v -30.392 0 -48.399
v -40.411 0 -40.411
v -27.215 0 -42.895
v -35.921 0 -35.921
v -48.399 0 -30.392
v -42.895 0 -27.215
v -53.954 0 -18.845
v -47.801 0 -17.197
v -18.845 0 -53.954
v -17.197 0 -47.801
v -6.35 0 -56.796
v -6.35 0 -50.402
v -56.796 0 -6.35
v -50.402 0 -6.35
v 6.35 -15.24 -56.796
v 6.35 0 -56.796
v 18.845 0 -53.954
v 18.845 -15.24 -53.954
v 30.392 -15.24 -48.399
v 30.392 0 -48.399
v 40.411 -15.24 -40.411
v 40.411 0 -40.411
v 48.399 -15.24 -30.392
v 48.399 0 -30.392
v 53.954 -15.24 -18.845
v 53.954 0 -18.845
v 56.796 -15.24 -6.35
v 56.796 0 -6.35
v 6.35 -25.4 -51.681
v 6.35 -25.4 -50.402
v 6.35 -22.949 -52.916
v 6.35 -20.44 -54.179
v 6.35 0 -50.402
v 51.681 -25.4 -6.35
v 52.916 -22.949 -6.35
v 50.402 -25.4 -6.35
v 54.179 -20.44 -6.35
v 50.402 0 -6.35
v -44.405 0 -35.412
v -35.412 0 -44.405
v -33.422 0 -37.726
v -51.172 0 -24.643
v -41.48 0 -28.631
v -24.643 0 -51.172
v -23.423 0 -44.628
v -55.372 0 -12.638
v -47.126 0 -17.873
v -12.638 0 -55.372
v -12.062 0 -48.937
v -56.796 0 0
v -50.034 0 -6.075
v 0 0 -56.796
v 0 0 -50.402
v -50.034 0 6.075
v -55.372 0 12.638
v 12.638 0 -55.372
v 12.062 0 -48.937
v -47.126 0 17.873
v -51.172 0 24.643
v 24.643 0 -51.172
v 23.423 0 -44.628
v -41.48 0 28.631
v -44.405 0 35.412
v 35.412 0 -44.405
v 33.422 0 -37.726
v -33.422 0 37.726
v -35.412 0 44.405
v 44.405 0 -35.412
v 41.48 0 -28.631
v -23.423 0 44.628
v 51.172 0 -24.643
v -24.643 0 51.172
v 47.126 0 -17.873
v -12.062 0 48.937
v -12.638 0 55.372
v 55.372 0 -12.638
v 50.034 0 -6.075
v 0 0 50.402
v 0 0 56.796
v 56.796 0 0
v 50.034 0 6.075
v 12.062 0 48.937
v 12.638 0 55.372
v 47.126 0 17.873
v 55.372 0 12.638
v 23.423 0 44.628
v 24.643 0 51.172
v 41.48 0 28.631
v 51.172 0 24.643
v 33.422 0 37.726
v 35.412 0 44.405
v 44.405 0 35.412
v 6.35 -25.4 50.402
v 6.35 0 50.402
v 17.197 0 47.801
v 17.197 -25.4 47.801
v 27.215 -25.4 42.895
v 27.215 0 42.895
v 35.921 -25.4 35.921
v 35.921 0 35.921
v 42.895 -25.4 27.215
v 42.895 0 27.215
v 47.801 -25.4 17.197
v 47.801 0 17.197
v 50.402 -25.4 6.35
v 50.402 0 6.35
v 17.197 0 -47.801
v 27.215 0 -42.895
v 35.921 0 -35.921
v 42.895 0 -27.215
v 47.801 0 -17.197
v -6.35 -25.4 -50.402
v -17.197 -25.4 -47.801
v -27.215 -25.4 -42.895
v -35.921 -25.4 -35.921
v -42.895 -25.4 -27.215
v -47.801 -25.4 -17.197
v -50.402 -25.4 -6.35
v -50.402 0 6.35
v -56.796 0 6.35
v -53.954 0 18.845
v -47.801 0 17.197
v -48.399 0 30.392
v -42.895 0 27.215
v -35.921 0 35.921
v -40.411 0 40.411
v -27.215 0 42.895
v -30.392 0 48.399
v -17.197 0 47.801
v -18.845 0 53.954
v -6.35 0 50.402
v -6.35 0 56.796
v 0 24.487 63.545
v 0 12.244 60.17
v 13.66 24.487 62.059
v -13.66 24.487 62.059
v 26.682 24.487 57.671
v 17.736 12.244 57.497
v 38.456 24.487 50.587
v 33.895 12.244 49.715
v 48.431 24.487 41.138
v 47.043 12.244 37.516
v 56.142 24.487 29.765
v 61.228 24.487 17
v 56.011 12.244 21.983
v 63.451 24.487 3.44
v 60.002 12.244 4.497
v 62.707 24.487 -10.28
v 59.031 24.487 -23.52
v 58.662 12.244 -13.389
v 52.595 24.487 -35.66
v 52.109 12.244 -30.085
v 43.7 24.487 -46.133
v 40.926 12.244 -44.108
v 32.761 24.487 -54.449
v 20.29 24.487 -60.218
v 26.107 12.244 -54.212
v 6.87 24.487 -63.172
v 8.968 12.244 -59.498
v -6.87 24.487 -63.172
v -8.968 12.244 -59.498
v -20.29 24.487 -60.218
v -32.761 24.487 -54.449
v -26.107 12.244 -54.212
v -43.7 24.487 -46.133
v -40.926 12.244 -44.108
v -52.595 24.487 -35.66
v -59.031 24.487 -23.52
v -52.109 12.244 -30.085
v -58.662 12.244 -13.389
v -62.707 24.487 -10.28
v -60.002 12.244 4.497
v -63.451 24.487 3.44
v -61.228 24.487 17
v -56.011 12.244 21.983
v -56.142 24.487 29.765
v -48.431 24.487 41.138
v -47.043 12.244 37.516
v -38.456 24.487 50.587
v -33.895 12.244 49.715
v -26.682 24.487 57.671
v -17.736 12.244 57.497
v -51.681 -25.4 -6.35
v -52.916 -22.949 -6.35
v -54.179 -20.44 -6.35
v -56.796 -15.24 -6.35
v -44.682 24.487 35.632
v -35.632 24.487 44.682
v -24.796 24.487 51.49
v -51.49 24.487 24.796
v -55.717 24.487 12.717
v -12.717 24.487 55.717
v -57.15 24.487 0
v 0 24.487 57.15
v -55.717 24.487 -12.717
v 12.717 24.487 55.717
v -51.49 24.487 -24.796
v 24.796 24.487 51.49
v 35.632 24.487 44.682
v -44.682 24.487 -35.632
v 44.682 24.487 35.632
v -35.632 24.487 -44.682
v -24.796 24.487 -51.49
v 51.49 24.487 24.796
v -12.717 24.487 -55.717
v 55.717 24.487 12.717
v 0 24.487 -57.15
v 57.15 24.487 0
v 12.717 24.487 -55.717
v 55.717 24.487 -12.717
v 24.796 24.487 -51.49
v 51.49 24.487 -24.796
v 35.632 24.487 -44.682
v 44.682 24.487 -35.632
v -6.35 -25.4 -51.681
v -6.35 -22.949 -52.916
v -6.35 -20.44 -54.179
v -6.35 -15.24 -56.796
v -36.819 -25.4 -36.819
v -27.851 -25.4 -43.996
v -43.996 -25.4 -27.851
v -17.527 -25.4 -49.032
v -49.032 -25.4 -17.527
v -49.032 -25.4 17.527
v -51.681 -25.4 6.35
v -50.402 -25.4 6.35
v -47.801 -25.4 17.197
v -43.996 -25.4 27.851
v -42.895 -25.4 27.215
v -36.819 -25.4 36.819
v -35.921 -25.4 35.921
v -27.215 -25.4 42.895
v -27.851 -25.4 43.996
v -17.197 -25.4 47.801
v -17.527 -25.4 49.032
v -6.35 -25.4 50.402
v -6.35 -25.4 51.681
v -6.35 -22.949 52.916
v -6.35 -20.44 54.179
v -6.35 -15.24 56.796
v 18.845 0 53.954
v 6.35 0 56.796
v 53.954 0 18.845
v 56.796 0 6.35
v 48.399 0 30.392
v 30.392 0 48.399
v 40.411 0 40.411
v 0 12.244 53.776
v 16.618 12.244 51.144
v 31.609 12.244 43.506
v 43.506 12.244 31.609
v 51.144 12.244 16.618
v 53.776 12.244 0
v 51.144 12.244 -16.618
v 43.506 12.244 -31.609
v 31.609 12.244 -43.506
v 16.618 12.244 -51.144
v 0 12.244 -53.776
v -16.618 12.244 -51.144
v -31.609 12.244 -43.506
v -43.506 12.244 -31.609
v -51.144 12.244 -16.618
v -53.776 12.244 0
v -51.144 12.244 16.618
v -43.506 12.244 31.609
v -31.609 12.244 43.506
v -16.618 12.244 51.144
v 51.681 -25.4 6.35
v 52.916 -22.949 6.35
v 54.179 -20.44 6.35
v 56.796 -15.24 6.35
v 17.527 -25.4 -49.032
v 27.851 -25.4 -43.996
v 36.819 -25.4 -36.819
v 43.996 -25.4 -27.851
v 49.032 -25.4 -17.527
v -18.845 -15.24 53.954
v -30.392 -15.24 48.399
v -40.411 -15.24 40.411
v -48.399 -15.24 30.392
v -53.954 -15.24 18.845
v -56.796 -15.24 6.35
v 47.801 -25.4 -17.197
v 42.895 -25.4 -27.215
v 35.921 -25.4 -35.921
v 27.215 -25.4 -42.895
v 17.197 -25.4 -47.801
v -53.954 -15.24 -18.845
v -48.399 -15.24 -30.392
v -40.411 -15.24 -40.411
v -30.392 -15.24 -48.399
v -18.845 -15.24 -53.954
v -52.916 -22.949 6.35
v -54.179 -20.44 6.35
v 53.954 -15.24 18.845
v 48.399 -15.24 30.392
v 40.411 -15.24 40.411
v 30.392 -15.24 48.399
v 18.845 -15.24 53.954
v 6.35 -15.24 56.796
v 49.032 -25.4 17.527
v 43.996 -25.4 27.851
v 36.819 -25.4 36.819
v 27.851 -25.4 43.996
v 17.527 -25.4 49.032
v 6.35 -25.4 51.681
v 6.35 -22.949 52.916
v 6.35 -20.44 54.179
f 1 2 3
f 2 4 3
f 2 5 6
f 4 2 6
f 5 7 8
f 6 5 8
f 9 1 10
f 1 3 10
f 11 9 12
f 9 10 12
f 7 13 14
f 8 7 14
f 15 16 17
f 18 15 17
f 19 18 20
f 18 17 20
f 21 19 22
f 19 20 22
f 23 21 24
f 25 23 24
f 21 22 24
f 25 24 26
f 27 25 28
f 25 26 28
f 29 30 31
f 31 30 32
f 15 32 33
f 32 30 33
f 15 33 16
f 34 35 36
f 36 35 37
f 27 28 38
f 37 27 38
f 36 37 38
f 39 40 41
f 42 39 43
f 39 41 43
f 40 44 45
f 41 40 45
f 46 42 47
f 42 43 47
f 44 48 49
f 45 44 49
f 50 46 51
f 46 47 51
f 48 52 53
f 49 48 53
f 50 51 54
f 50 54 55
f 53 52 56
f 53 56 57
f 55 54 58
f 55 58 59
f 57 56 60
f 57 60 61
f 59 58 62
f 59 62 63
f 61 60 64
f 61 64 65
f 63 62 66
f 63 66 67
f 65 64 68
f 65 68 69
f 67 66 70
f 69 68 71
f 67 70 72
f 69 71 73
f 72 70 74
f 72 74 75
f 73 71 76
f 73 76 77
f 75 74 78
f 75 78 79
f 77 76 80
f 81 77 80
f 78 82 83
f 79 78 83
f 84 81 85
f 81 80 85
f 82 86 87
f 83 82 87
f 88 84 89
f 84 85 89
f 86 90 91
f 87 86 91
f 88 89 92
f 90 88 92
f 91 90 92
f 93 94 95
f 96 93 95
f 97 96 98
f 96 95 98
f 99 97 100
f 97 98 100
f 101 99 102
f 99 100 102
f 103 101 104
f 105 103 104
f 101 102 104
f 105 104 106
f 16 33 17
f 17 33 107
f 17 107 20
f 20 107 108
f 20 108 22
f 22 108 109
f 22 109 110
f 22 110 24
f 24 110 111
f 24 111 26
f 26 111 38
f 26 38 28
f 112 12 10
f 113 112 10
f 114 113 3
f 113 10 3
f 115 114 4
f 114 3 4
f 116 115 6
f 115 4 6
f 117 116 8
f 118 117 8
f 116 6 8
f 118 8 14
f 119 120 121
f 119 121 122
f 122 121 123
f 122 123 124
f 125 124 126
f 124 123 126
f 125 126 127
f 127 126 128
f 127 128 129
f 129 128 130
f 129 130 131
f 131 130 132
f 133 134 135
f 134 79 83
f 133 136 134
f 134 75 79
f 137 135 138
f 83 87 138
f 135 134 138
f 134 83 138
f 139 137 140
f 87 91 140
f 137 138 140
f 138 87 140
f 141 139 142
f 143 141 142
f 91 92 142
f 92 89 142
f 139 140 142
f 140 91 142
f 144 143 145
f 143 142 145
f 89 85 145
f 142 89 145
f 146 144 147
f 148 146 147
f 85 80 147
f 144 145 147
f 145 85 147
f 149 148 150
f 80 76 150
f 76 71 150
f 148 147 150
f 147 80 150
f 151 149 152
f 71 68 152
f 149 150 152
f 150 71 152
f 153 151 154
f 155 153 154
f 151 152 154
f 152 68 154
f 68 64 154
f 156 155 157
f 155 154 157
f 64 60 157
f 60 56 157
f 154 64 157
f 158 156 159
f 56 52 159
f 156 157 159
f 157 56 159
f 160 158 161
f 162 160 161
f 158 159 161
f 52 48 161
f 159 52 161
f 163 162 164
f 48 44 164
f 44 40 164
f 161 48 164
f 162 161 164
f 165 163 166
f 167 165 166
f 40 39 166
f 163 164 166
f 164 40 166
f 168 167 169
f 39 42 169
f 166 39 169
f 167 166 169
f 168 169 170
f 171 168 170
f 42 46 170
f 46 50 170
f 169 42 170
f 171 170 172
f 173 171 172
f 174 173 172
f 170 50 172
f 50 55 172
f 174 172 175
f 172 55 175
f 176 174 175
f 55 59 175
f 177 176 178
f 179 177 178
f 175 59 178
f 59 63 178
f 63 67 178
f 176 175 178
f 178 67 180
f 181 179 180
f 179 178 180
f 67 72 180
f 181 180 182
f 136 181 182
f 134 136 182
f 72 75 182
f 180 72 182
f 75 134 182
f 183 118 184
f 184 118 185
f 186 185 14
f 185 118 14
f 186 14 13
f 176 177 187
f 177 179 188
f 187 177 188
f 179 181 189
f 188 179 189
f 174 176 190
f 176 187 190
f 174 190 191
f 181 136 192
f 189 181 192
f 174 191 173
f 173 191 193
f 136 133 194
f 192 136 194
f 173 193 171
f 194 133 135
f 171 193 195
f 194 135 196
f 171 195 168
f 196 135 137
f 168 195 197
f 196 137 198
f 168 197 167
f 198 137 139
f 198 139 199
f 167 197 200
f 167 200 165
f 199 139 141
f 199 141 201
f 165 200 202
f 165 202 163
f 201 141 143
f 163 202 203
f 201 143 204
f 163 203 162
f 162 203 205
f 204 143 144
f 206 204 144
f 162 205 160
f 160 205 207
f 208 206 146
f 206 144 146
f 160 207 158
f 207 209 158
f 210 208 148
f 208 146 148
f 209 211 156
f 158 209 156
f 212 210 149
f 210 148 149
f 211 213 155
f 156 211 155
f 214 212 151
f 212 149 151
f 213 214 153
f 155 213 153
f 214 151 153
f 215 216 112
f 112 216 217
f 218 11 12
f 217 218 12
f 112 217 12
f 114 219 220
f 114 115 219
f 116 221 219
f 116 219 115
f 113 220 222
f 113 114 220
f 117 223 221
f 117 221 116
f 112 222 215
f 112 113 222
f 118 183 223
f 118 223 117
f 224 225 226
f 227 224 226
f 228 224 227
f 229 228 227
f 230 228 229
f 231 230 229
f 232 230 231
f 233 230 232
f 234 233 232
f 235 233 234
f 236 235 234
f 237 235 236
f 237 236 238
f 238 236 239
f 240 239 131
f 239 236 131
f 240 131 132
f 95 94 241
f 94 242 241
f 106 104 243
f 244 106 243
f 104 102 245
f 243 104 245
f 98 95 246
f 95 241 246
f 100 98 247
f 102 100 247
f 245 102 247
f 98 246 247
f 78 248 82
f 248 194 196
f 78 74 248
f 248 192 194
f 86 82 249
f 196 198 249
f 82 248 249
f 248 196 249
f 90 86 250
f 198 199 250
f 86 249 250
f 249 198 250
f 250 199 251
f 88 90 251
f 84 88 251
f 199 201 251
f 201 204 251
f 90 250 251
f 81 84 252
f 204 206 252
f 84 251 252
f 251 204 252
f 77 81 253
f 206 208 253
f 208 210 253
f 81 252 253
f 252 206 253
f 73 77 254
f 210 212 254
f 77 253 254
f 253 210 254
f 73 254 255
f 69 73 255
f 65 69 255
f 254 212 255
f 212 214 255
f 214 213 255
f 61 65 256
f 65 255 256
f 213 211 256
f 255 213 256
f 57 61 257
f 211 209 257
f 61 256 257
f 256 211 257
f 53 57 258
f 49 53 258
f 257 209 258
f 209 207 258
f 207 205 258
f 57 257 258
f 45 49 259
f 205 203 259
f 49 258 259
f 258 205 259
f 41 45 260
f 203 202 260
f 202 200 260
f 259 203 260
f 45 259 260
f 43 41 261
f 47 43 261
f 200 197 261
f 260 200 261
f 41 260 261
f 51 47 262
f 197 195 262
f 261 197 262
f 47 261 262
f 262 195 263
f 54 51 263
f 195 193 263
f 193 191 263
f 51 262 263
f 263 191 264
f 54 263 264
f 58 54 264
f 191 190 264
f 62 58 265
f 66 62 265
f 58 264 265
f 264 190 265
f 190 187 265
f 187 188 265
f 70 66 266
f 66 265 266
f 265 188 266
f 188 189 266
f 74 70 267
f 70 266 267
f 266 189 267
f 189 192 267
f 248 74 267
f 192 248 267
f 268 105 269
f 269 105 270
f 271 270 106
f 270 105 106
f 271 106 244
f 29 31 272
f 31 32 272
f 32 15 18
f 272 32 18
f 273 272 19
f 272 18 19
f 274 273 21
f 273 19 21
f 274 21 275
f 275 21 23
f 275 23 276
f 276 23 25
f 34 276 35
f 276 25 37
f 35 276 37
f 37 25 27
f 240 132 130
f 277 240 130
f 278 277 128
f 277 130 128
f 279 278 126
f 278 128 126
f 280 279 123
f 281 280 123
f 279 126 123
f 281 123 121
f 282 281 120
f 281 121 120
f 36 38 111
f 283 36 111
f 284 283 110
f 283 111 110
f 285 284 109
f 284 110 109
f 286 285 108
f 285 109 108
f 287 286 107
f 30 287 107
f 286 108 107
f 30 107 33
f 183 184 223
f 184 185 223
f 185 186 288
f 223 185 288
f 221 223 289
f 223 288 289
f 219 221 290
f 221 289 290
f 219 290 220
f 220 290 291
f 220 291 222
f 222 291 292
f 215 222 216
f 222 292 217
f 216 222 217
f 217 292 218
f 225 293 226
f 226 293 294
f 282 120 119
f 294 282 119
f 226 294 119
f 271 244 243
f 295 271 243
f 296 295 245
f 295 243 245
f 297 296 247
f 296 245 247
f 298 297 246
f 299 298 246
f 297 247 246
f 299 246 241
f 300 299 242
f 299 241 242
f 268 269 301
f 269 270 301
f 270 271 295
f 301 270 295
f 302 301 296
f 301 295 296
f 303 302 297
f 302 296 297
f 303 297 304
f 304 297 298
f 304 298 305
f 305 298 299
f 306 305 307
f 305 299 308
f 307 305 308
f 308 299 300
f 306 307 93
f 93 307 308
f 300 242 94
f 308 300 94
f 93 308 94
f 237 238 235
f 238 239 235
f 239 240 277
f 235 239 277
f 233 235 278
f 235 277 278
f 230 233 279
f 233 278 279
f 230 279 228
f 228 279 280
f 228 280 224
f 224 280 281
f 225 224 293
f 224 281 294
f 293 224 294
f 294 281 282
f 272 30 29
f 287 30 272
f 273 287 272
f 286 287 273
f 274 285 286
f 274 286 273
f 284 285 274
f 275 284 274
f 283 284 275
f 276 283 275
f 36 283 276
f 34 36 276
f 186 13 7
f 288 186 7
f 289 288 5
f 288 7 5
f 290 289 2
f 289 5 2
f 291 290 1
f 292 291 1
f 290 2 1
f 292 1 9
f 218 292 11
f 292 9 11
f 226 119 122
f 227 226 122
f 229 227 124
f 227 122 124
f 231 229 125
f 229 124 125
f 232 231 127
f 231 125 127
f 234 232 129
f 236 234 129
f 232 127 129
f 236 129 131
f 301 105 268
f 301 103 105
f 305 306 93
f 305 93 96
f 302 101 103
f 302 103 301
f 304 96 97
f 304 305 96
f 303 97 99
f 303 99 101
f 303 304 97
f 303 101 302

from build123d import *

# Parameters (mm, degrees)
F1_DEPTH   = 25.4
F4_SIZE2   = 10.16
F4_SIZE    = 5.08
F4_2_SIZE2 = 10.16
F4_2_SIZE  = 5.08
F4_3_SIZE2 = 10.16
F4_3_SIZE  = 5.08
F4_4_SIZE2 = 10.16
F4_4_SIZE  = 5.08


with BuildPart() as f1:
    # F0 (on Front) → F1 (new body)
    with BuildSketch(Plane.XZ):
        with BuildLine():
            ThreePointArc((-50.4015624758, 6.35), (-35.9210244843, 35.9210244843), (-6.35, 50.4015624758))
            Line((-6.35, 50.4015624758), (-6.35, 56.7961266285))
            ThreePointArc((-6.35, 56.7961266285), (-40.4111525448, 40.4111525448), (-56.7961266285, 6.35))
            Line((-56.7961266285, 6.35), (-50.4015624758, 6.35))
        make_face()
    extrude(amount=F1_DEPTH)

    # F4#2
    f4_2_edges = [f1.edges().sort_by_distance(p)[0] for p in [
        (-40.411153, -25.4, 40.411153),
    ]]
    f4_2_side = f1.faces().sort_by_distance((-36.425486, -25.4, 36.425486))[0]
    chamfer(f4_2_edges, length=F4_2_SIZE, length2=F4_2_SIZE2, reference=f4_2_side)


with BuildPart() as f1b:
    # F0 (on Front) → F1, piece 2 (new body)
    with BuildSketch(Plane.XZ):
        with BuildLine():
            ThreePointArc((6.35, 50.4015624758), (35.9210244843, 35.9210244843), (50.4015624758, 6.35))
            Line((50.4015624758, 6.35), (56.7961266285, 6.35))
            ThreePointArc((56.7961266285, 6.35), (40.4111525448, 40.4111525448), (6.35, 56.7961266285))
            Line((6.35, 56.7961266285), (6.35, 50.4015624758))
        make_face()
    extrude(amount=F1_DEPTH)

    # F4
    f4_edges = [f1b.edges().sort_by_distance(p)[0] for p in [
        (40.411153, -25.4, 40.411153),
    ]]
    f4_side = f1b.faces().sort_by_distance((7.063416, -25.4, 53.598845))[0]
    chamfer(f4_edges, length=F4_SIZE, length2=F4_SIZE2, reference=f4_side)


with BuildPart() as f1c:
    # F0 (on Front) → F1, piece 3 (new body)
    with BuildSketch(Plane.XZ):
        with BuildLine():
            Line((56.7961266285, -6.35), (50.4015624758, -6.35))
            ThreePointArc((50.4015624758, -6.35), (35.9210244843, -35.9210244843), (6.35, -50.4015624758))
            Line((6.35, -50.4015624758), (6.35, -56.7961266285))
            ThreePointArc((6.35, -56.7961266285), (40.4111525448, -40.4111525448), (56.7961266285, -6.35))
        make_face()
    extrude(amount=F1_DEPTH)

    # F4#4
    f4_4_edges = [f1c.edges().sort_by_distance(p)[0] for p in [
        (40.411153, -25.4, -40.411153),
    ]]
    f4_4_side = f1c.faces().sort_by_distance((39.906691, -25.4, -39.906691))[0]
    chamfer(f4_4_edges, length=F4_4_SIZE, length2=F4_4_SIZE2, reference=f4_4_side)


with BuildPart() as f1d:
    # F0 (on Front) → F1, piece 4 (new body)
    with BuildSketch(Plane.XZ):
        with BuildLine():
            Line((-6.35, -56.7961266285), (-6.35, -50.4015624758))
            ThreePointArc((-6.35, -50.4015624758), (-35.9210244843, -35.9210244843), (-50.4015624758, -6.35))
            Line((-50.4015624758, -6.35), (-56.7961266285, -6.35))
            ThreePointArc((-56.7961266285, -6.35), (-40.4111525448, -40.4111525448), (-6.35, -56.7961266285))
        make_face()
    extrude(amount=F1_DEPTH)

    # F4#3
    f4_3_edges = [f1d.edges().sort_by_distance(p)[0] for p in [
        (-40.411153, -25.4, -40.411153),
    ]]
    f4_3_side = f1d.faces().sort_by_distance((-39.906691, -25.4, -39.906691))[0]
    chamfer(f4_3_edges, length=F4_3_SIZE, length2=F4_3_SIZE2, reference=f4_3_side)


with BuildPart() as f3:
    # F2 (on Right) → F3 (revolve)
    with BuildSketch(Plane.YZ):
        Polygon((24.4871107112, 63.5445641527), (0, 56.7961266285), (0, 50.4015624758), (24.4871107112, 57.15), align=None)
    revolve(axis=Axis((0, 13.5470032692, 0), (0, 1, 0)))


solid = Compound([f1.part, f1b.part, f1c.part, f1d.part, f3.part])
